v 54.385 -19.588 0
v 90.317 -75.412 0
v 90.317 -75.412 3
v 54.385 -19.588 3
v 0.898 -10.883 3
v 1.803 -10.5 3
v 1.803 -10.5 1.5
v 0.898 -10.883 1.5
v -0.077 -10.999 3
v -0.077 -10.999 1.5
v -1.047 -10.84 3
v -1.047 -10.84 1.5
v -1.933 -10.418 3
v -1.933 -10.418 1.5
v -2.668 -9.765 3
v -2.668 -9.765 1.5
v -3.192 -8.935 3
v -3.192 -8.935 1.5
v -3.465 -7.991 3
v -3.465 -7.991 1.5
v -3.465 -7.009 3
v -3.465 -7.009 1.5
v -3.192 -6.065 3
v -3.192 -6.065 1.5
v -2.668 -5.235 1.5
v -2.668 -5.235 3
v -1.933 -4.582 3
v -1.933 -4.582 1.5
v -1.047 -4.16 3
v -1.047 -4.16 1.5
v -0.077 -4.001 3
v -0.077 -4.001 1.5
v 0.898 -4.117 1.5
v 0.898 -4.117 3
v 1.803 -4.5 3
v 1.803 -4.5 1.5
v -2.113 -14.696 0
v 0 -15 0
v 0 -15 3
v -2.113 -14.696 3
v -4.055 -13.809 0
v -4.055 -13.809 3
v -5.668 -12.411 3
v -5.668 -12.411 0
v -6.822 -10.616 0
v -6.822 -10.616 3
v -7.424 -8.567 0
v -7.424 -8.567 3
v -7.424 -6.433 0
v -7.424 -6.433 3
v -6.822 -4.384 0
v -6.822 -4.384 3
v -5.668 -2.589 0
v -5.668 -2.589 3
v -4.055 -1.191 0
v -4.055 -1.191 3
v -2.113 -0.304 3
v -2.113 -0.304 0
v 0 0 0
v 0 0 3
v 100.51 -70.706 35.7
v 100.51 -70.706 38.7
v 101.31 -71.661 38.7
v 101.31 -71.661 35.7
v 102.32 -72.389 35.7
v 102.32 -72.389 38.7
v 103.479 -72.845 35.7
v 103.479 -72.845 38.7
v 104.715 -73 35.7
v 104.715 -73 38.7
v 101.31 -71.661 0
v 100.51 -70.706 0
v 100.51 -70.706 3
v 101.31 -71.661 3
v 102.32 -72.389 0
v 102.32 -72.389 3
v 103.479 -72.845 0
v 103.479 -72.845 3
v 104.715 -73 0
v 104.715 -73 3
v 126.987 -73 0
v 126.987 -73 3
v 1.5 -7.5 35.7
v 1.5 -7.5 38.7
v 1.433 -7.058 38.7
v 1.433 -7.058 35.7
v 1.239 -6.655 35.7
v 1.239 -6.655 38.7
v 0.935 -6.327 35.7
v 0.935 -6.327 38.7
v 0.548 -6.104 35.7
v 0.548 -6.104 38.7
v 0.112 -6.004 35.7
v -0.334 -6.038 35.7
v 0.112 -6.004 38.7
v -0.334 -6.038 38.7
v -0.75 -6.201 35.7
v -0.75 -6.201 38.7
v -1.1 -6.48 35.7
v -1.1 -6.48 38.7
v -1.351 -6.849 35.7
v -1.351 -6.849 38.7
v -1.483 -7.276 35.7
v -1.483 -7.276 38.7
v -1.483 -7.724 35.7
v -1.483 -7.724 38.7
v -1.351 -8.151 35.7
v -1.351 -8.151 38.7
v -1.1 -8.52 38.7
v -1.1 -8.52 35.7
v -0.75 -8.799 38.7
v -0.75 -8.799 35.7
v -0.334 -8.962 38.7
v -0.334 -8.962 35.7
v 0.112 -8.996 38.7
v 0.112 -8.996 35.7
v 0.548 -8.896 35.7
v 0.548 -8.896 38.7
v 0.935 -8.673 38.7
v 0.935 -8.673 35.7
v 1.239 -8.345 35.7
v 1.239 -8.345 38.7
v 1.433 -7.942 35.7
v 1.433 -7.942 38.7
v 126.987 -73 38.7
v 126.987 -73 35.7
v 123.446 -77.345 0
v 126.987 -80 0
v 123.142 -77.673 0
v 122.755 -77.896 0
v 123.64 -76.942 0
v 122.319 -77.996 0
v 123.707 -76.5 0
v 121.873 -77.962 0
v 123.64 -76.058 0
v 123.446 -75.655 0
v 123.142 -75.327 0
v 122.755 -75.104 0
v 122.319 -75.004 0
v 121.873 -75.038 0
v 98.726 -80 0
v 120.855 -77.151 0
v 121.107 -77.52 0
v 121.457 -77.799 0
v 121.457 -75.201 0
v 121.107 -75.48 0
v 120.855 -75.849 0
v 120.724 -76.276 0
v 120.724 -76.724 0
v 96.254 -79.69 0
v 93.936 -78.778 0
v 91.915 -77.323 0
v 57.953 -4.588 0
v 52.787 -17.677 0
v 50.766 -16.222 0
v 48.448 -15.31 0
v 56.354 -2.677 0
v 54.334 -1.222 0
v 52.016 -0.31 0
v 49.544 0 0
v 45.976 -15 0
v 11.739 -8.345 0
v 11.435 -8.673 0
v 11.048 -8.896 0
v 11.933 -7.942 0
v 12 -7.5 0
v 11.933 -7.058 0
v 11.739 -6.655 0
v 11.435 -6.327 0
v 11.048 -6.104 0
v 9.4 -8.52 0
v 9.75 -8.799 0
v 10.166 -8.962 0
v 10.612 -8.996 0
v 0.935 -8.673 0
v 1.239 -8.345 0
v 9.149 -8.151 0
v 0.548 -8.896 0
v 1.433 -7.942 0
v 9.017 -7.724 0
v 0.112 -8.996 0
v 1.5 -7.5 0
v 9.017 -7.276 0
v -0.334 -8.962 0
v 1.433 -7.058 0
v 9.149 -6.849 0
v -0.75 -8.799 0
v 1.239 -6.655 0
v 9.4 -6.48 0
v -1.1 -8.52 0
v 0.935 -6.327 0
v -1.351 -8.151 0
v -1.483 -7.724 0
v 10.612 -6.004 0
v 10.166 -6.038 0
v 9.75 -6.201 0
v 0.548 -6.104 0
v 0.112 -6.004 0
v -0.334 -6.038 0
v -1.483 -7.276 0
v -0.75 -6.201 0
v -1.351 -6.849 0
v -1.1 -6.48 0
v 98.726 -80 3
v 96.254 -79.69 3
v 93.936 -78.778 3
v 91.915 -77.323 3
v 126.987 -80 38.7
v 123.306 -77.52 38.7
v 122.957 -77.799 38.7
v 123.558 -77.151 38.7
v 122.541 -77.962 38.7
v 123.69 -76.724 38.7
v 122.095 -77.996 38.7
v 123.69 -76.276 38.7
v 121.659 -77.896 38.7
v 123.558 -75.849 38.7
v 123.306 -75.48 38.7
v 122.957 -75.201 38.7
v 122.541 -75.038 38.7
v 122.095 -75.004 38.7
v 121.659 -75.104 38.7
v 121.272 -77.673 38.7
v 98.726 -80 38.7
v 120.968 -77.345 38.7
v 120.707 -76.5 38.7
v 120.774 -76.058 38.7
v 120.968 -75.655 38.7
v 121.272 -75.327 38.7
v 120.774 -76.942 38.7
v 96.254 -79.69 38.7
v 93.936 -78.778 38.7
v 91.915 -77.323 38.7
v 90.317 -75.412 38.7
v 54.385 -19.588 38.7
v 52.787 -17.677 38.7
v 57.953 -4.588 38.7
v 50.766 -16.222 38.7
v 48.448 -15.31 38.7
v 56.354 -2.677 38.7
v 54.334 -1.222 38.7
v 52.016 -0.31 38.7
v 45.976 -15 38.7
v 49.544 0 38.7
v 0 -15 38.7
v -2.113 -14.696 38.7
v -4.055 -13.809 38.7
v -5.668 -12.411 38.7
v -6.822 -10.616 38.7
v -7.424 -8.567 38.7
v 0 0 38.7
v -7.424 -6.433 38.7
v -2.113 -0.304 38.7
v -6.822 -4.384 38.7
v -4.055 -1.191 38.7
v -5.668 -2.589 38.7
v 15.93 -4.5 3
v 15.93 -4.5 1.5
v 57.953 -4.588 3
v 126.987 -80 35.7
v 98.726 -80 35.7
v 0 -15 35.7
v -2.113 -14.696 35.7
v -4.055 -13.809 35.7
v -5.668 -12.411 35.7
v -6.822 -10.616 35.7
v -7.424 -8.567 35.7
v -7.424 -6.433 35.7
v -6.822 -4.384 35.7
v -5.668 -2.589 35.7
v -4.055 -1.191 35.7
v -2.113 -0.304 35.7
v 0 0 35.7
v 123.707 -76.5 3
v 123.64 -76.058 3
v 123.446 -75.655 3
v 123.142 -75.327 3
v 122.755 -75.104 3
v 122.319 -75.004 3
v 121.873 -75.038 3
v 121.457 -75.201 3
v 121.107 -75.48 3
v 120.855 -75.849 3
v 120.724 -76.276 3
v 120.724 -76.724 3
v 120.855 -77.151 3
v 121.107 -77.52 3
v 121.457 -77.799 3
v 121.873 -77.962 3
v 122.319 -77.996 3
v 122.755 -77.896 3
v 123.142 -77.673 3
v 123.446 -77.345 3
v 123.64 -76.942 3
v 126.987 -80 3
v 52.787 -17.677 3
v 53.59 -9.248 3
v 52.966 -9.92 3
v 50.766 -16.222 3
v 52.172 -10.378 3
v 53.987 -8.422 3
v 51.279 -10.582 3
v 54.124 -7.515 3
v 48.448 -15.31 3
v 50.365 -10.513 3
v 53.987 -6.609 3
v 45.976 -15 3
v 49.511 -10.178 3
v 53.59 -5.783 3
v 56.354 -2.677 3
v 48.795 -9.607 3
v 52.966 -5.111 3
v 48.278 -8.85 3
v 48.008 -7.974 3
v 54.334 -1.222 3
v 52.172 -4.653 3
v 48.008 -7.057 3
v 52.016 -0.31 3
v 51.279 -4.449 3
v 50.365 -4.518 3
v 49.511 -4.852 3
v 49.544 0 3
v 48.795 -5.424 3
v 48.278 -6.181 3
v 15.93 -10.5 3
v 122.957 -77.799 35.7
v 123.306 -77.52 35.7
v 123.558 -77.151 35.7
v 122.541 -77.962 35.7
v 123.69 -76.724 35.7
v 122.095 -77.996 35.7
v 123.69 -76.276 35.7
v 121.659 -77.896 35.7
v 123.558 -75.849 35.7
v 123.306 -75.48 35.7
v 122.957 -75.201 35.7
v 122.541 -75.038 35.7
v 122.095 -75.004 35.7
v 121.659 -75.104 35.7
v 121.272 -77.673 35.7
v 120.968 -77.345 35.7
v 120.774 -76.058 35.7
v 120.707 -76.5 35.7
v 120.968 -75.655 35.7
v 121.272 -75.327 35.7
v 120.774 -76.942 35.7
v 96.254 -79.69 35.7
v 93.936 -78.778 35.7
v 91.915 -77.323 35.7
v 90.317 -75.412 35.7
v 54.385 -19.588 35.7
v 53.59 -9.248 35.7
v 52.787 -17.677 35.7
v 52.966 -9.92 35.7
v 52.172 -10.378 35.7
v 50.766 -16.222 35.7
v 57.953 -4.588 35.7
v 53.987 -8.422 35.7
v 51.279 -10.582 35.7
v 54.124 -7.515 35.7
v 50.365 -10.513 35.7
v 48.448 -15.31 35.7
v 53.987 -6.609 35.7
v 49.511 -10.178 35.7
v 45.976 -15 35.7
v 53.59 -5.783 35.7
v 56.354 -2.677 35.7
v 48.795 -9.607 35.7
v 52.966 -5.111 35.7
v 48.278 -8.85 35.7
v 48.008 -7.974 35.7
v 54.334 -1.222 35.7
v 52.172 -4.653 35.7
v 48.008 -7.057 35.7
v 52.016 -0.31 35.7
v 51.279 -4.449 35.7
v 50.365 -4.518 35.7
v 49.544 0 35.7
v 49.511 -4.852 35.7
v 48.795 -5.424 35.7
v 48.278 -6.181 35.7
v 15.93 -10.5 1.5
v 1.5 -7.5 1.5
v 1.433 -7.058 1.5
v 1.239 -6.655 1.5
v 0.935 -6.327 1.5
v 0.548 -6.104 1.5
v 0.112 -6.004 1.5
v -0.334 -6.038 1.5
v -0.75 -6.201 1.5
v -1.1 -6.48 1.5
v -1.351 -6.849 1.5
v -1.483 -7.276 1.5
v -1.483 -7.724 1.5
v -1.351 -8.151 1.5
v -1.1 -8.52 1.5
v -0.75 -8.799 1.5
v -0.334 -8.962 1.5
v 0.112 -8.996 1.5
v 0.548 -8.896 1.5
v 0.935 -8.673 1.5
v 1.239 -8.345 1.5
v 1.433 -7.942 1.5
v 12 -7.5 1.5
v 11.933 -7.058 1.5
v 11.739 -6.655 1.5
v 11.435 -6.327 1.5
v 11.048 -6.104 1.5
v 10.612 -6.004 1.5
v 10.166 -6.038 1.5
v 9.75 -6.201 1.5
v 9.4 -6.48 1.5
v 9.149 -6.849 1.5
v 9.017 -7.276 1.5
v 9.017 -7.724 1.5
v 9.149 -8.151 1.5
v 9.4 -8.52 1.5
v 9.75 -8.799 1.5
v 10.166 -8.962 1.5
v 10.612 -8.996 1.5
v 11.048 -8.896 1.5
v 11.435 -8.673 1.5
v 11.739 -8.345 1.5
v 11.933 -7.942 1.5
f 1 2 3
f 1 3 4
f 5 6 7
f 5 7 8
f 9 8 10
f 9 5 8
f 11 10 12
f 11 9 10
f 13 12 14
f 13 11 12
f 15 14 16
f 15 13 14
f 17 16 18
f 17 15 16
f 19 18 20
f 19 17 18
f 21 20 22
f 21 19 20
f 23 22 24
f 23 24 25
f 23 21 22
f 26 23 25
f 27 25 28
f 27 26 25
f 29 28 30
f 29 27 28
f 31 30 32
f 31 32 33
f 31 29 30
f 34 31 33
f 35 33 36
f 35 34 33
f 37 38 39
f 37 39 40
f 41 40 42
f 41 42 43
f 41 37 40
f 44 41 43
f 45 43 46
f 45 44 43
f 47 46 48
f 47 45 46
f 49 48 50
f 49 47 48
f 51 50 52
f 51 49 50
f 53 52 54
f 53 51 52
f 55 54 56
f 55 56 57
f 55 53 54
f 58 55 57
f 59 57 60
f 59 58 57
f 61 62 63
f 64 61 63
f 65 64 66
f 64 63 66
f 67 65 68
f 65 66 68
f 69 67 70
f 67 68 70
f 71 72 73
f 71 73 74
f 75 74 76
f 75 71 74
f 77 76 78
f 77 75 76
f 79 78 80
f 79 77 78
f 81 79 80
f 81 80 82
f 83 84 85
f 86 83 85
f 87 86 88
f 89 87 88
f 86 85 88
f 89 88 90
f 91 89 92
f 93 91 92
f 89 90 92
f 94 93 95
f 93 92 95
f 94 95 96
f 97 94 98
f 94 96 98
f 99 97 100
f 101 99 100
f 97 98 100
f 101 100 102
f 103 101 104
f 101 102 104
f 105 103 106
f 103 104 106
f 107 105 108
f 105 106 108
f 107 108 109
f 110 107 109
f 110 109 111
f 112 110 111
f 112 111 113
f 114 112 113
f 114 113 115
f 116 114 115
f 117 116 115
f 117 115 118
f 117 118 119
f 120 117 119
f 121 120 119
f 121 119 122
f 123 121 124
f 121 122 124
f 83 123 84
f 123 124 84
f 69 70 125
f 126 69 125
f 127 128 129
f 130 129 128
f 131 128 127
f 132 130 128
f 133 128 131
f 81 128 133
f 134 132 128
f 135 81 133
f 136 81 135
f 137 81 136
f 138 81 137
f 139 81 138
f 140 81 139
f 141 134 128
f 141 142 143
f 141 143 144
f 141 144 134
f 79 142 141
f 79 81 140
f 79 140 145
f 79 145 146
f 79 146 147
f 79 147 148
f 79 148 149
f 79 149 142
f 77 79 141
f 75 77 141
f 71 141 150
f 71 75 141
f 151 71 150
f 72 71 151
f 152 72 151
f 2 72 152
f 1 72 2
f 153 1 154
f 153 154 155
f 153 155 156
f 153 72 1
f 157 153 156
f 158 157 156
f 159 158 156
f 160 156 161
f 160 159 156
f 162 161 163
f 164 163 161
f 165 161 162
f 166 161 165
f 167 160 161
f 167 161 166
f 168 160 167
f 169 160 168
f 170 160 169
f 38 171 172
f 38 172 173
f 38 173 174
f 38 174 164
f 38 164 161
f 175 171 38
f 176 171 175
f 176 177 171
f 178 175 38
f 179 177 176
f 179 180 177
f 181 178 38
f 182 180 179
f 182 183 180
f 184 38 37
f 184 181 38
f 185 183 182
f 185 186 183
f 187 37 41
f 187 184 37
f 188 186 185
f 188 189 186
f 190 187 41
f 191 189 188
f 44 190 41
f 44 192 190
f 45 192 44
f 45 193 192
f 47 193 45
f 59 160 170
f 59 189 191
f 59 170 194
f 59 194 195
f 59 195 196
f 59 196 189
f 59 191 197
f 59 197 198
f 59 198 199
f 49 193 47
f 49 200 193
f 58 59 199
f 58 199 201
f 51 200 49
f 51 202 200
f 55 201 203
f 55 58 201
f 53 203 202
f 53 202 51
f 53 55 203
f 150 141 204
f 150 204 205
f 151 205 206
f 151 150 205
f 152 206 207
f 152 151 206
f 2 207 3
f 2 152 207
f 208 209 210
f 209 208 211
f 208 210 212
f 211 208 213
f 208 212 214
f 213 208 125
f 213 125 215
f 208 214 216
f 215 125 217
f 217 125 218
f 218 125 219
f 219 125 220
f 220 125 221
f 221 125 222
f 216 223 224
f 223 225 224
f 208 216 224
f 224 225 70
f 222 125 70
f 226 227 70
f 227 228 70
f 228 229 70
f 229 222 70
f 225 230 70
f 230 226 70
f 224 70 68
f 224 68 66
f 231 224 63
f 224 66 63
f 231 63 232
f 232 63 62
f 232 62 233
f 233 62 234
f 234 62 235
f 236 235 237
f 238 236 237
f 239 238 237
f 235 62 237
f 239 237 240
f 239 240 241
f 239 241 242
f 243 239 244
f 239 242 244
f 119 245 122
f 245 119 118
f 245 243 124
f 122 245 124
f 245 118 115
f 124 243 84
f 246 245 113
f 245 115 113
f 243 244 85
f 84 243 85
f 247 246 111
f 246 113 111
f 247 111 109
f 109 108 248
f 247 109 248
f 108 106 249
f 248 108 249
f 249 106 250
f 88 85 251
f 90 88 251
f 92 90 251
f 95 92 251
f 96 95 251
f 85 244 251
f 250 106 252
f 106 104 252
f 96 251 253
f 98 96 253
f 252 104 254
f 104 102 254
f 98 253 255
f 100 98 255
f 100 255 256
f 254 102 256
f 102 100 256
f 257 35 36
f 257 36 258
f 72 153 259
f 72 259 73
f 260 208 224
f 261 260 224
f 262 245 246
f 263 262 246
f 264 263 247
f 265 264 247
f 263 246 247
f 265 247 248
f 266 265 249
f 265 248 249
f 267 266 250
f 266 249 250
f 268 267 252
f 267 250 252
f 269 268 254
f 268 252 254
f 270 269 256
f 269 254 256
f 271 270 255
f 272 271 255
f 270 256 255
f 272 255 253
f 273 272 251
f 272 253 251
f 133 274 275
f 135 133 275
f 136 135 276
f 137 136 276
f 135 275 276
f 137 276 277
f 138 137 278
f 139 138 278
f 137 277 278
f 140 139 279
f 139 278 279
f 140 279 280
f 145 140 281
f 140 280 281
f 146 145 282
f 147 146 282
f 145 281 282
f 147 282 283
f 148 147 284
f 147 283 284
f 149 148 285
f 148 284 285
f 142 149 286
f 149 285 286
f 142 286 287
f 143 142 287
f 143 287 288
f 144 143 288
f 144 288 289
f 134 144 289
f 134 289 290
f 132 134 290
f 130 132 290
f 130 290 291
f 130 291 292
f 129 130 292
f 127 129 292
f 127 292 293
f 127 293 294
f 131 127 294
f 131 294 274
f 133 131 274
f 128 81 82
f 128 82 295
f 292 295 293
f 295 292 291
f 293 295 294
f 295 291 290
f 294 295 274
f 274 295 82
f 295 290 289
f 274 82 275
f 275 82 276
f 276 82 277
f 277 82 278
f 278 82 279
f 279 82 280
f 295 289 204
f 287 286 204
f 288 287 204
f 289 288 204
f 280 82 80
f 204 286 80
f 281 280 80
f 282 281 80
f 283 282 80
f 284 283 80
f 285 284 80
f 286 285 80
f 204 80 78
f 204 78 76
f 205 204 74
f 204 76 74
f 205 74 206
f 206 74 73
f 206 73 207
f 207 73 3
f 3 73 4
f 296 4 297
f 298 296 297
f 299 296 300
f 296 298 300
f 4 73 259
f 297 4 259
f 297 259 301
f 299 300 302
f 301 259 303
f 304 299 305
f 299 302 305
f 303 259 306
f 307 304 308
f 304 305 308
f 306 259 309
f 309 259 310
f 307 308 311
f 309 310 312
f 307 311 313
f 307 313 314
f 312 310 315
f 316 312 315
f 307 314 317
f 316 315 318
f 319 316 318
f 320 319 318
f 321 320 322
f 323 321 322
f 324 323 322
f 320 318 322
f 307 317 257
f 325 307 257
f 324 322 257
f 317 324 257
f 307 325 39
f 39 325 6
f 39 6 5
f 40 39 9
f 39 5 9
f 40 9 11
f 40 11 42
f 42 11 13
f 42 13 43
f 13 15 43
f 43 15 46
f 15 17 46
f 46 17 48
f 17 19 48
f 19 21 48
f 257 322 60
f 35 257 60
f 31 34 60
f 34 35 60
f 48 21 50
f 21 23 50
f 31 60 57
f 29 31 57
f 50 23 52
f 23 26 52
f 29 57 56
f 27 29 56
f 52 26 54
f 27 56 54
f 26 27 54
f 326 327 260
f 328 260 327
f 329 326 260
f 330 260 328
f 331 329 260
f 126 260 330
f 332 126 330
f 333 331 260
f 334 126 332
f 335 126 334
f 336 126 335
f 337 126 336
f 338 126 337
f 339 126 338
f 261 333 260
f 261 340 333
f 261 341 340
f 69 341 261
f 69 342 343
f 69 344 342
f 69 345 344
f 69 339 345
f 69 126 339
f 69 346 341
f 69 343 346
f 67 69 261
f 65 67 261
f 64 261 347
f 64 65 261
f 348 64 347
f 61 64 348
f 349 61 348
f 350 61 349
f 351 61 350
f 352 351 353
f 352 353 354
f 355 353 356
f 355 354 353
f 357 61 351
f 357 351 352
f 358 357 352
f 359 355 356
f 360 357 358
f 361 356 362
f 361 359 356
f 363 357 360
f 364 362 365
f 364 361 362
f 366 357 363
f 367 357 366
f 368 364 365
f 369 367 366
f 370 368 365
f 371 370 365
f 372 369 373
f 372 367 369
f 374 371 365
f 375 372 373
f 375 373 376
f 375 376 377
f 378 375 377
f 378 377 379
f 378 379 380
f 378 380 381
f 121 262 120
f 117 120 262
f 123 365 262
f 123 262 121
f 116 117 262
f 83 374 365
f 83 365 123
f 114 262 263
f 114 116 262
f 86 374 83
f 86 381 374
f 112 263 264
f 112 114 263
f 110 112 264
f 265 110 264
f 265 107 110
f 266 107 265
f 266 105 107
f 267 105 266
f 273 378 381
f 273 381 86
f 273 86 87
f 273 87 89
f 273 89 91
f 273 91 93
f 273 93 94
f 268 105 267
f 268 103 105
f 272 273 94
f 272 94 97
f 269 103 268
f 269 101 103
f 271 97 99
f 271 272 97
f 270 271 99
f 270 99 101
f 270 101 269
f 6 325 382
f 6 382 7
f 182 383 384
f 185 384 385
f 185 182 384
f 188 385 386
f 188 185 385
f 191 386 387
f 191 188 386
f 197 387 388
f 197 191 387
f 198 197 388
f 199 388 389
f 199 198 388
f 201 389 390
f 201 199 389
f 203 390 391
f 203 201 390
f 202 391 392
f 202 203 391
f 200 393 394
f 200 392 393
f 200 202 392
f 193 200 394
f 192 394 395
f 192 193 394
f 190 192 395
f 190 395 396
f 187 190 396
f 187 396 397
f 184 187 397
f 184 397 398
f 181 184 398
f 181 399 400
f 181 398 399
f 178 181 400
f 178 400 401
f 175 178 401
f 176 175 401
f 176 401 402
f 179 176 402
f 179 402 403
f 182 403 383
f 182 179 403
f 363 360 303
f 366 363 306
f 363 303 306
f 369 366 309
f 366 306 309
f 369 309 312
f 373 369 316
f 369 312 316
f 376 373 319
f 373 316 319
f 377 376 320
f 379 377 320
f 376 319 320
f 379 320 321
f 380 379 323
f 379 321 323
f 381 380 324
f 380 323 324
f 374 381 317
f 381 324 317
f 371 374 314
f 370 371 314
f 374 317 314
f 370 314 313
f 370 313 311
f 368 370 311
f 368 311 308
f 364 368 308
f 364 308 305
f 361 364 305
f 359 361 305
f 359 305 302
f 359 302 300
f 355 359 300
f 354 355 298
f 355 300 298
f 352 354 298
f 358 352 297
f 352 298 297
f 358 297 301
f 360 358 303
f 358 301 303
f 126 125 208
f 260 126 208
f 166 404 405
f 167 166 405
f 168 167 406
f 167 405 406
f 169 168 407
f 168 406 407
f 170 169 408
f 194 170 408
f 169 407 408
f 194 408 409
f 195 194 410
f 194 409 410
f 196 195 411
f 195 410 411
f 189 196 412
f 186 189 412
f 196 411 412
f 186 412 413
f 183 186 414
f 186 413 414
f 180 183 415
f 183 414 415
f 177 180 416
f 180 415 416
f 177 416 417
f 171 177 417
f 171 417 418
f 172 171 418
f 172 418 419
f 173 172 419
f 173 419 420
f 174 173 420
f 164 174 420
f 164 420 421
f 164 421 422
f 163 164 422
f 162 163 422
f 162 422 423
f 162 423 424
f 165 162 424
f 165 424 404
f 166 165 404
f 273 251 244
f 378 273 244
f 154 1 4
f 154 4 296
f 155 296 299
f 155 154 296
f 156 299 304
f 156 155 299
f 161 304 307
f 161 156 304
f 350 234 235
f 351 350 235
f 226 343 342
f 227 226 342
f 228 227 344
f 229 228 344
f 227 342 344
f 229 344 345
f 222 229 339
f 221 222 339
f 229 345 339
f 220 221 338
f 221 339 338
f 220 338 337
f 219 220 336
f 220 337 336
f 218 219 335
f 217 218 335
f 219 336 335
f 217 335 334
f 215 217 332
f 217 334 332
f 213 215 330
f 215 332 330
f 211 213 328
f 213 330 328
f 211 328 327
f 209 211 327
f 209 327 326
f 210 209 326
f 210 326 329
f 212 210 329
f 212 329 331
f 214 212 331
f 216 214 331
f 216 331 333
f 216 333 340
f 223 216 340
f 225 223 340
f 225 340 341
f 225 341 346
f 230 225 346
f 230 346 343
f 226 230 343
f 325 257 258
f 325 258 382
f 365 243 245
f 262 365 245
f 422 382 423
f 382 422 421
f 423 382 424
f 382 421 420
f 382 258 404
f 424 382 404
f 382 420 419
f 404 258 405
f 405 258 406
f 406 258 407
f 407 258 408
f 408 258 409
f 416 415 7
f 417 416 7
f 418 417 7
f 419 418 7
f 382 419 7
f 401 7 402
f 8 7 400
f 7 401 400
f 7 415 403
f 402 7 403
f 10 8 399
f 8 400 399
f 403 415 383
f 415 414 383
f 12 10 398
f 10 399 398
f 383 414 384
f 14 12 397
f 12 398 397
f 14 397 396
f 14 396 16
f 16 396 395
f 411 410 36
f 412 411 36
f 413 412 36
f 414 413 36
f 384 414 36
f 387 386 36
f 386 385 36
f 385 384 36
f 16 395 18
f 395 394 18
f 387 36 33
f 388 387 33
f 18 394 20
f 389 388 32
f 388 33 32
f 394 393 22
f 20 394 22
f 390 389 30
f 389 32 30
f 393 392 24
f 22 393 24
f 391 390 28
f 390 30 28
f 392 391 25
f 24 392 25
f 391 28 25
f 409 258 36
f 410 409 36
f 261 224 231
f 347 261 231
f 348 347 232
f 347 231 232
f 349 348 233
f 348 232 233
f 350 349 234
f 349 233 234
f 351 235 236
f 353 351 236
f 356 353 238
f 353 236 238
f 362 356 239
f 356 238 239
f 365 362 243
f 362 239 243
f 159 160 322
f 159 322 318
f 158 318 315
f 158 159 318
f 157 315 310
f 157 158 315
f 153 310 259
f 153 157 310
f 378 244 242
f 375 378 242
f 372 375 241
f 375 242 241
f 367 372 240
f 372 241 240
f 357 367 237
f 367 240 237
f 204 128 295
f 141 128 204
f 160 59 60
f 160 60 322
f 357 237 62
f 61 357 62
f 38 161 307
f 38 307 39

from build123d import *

# Parameters (mm, degrees)
SKETCH_324_R             = 1.5
EXTRUDE_1_DEPTH          = 3
SKETCH_2_R               = 1.5
CUT_EXTRUDE_1_DEPTH      = 111.5
CUT_EXTRUDE_1_DEPTH_BACK = 41.5
CUT_EXTRUDE_2_DEPTH      = 1.5
SKETCH_6_R               = 1.5
CUT_EXTRUDE_3_DEPTH      = 2.5
SKETCH_8_R               = 3.075
EXTRUDE_3_DEPTH          = 16.35
MIRROR_8_COPY_1_SKETCH_R = 3.075
MIRROR_8_COPY_1_DEPTH    = 16.35
MIRROR_8_COPY_2_SKETCH_R = 3.075
MIRROR_8_COPY_2_DEPTH    = 16.35
SKETCH_11_R              = 1.5
CUT_EXTRUDE_4_DEPTH      = 41.5


with BuildPart() as part:
    # Sketch 324 → 填料-伸長1 (new body)
    with BuildSketch(Plane.XY):
        with BuildLine():
            ThreePointArc((100.510480498, -70.70616545), (102.320143894, -72.389238388), (104.714843536, -73))
            Line((104.714843536, -73), (126.986921935, -73))
            Line((126.986921935, -73), (126.986921935, -80))
            Line((126.986921935, -80), (98.725740556, -80))
            ThreePointArc((98.725740556, -80), (93.936341272, -78.778476776), (90.317014479, -75.4123309))
            Line((90.317014479, -75.4123309), (54.385110012, -19.5876691))
            ThreePointArc((54.385110012, -19.5876691), (50.76578322, -16.221523224), (45.976383936, -15))
            Line((45.976383936, -15), (2.168890098, -15))
            Line((2.168890098, -15), (0, -15))
            ThreePointArc((0, -15), (-7.5, -7.5), (0, 0))
            Line((0, 0), (49.544156798, 0))
            ThreePointArc((49.544156798, 0), (54.333556082, -1.221523224), (57.952882875, -4.5876691))
            Line((57.952882875, -4.5876691), (100.510480498, -70.70616545))
        make_face()
        with Locations((0, -7.5)):
            Circle(SKETCH_324_R, mode=Mode.SUBTRACT)
    extrude_1 = extrude(amount=EXTRUDE_1_DEPTH)

    # 草圖2 → 除料-伸長1 (cut, two sides)
    with BuildSketch(Plane.XY.offset(3)) as cut_extrude_1_sk:
        with Locations((122.206921935, -76.5)):
            Circle(SKETCH_2_R)
    extrude(amount=CUT_EXTRUDE_1_DEPTH, mode=Mode.SUBTRACT)
    extrude(cut_extrude_1_sk.sketch, amount=-CUT_EXTRUDE_1_DEPTH_BACK, mode=Mode.SUBTRACT)

    # 草圖5 → 除料-伸長2 (cut)
    with BuildSketch(Plane.XY.offset(3)):
        with BuildLine():
            Line((1.802775638, -4.5), (15.929780582, -4.5))
            Line((15.929780582, -4.5), (15.929780582, -10.5))
            Line((15.929780582, -10.5), (1.802775638, -10.5))
            ThreePointArc((1.802775638, -10.5), (-3.5, -7.5), (1.802775638, -4.5))
        make_face()
    extrude(amount=-CUT_EXTRUDE_2_DEPTH, mode=Mode.SUBTRACT)

    # 草圖6 → 除料-伸長3 (cut, through all)
    with BuildSketch(Plane.XY.offset(1.5)):
        with Locations((10.5, -7.5)):
            Circle(SKETCH_6_R)
    extrude(amount=-CUT_EXTRUDE_3_DEPTH, mode=Mode.SUBTRACT)

    # 草圖8 → 填料-伸長3 (add)
    with BuildSketch(Plane.XY.offset(3)):
        with Locations((51.04897254, -7.515441374)):
            Circle(SKETCH_8_R)
    extrude_3 = extrude(amount=EXTRUDE_3_DEPTH)

    # 鏡射7: 填料-伸長3 across plane
    add(extrude_3.mirror(Plane.XY.offset(19.35)))

    # 鏡射8: 填料-伸長1 across plane
    add(extrude_1.mirror(Plane.XY.offset(19.35)))

    # 鏡射8 copy 1 sketch → 鏡射8 copy 1 (add)
    with BuildSketch(Plane.XY.offset(3)):
        with Locations((51.04897254, -7.515441374)):
            Circle(MIRROR_8_COPY_1_SKETCH_R)
    extrude(amount=MIRROR_8_COPY_1_DEPTH)

    # 鏡射8 copy 2 sketch → 鏡射8 copy 2 (add)
    with BuildSketch(Plane(origin=(0, 0, 35.7), x_dir=(1, 0, 0), z_dir=(0, 0, -1))):
        with Locations((51.04897254, 7.515441374)):
            Circle(MIRROR_8_COPY_2_SKETCH_R)
    extrude(amount=MIRROR_8_COPY_2_DEPTH)

    # 草圖11 → 除料-伸長4 (cut)
    with BuildSketch(Plane(origin=(0, 0, 35.7), x_dir=(-1, 0, 0), z_dir=(0, 0, -1))):
        with Locations((-122.206921935, -76.5)):
            Circle(SKETCH_11_R)
    extrude(amount=-CUT_EXTRUDE_4_DEPTH, mode=Mode.SUBTRACT)


solid = part.part
